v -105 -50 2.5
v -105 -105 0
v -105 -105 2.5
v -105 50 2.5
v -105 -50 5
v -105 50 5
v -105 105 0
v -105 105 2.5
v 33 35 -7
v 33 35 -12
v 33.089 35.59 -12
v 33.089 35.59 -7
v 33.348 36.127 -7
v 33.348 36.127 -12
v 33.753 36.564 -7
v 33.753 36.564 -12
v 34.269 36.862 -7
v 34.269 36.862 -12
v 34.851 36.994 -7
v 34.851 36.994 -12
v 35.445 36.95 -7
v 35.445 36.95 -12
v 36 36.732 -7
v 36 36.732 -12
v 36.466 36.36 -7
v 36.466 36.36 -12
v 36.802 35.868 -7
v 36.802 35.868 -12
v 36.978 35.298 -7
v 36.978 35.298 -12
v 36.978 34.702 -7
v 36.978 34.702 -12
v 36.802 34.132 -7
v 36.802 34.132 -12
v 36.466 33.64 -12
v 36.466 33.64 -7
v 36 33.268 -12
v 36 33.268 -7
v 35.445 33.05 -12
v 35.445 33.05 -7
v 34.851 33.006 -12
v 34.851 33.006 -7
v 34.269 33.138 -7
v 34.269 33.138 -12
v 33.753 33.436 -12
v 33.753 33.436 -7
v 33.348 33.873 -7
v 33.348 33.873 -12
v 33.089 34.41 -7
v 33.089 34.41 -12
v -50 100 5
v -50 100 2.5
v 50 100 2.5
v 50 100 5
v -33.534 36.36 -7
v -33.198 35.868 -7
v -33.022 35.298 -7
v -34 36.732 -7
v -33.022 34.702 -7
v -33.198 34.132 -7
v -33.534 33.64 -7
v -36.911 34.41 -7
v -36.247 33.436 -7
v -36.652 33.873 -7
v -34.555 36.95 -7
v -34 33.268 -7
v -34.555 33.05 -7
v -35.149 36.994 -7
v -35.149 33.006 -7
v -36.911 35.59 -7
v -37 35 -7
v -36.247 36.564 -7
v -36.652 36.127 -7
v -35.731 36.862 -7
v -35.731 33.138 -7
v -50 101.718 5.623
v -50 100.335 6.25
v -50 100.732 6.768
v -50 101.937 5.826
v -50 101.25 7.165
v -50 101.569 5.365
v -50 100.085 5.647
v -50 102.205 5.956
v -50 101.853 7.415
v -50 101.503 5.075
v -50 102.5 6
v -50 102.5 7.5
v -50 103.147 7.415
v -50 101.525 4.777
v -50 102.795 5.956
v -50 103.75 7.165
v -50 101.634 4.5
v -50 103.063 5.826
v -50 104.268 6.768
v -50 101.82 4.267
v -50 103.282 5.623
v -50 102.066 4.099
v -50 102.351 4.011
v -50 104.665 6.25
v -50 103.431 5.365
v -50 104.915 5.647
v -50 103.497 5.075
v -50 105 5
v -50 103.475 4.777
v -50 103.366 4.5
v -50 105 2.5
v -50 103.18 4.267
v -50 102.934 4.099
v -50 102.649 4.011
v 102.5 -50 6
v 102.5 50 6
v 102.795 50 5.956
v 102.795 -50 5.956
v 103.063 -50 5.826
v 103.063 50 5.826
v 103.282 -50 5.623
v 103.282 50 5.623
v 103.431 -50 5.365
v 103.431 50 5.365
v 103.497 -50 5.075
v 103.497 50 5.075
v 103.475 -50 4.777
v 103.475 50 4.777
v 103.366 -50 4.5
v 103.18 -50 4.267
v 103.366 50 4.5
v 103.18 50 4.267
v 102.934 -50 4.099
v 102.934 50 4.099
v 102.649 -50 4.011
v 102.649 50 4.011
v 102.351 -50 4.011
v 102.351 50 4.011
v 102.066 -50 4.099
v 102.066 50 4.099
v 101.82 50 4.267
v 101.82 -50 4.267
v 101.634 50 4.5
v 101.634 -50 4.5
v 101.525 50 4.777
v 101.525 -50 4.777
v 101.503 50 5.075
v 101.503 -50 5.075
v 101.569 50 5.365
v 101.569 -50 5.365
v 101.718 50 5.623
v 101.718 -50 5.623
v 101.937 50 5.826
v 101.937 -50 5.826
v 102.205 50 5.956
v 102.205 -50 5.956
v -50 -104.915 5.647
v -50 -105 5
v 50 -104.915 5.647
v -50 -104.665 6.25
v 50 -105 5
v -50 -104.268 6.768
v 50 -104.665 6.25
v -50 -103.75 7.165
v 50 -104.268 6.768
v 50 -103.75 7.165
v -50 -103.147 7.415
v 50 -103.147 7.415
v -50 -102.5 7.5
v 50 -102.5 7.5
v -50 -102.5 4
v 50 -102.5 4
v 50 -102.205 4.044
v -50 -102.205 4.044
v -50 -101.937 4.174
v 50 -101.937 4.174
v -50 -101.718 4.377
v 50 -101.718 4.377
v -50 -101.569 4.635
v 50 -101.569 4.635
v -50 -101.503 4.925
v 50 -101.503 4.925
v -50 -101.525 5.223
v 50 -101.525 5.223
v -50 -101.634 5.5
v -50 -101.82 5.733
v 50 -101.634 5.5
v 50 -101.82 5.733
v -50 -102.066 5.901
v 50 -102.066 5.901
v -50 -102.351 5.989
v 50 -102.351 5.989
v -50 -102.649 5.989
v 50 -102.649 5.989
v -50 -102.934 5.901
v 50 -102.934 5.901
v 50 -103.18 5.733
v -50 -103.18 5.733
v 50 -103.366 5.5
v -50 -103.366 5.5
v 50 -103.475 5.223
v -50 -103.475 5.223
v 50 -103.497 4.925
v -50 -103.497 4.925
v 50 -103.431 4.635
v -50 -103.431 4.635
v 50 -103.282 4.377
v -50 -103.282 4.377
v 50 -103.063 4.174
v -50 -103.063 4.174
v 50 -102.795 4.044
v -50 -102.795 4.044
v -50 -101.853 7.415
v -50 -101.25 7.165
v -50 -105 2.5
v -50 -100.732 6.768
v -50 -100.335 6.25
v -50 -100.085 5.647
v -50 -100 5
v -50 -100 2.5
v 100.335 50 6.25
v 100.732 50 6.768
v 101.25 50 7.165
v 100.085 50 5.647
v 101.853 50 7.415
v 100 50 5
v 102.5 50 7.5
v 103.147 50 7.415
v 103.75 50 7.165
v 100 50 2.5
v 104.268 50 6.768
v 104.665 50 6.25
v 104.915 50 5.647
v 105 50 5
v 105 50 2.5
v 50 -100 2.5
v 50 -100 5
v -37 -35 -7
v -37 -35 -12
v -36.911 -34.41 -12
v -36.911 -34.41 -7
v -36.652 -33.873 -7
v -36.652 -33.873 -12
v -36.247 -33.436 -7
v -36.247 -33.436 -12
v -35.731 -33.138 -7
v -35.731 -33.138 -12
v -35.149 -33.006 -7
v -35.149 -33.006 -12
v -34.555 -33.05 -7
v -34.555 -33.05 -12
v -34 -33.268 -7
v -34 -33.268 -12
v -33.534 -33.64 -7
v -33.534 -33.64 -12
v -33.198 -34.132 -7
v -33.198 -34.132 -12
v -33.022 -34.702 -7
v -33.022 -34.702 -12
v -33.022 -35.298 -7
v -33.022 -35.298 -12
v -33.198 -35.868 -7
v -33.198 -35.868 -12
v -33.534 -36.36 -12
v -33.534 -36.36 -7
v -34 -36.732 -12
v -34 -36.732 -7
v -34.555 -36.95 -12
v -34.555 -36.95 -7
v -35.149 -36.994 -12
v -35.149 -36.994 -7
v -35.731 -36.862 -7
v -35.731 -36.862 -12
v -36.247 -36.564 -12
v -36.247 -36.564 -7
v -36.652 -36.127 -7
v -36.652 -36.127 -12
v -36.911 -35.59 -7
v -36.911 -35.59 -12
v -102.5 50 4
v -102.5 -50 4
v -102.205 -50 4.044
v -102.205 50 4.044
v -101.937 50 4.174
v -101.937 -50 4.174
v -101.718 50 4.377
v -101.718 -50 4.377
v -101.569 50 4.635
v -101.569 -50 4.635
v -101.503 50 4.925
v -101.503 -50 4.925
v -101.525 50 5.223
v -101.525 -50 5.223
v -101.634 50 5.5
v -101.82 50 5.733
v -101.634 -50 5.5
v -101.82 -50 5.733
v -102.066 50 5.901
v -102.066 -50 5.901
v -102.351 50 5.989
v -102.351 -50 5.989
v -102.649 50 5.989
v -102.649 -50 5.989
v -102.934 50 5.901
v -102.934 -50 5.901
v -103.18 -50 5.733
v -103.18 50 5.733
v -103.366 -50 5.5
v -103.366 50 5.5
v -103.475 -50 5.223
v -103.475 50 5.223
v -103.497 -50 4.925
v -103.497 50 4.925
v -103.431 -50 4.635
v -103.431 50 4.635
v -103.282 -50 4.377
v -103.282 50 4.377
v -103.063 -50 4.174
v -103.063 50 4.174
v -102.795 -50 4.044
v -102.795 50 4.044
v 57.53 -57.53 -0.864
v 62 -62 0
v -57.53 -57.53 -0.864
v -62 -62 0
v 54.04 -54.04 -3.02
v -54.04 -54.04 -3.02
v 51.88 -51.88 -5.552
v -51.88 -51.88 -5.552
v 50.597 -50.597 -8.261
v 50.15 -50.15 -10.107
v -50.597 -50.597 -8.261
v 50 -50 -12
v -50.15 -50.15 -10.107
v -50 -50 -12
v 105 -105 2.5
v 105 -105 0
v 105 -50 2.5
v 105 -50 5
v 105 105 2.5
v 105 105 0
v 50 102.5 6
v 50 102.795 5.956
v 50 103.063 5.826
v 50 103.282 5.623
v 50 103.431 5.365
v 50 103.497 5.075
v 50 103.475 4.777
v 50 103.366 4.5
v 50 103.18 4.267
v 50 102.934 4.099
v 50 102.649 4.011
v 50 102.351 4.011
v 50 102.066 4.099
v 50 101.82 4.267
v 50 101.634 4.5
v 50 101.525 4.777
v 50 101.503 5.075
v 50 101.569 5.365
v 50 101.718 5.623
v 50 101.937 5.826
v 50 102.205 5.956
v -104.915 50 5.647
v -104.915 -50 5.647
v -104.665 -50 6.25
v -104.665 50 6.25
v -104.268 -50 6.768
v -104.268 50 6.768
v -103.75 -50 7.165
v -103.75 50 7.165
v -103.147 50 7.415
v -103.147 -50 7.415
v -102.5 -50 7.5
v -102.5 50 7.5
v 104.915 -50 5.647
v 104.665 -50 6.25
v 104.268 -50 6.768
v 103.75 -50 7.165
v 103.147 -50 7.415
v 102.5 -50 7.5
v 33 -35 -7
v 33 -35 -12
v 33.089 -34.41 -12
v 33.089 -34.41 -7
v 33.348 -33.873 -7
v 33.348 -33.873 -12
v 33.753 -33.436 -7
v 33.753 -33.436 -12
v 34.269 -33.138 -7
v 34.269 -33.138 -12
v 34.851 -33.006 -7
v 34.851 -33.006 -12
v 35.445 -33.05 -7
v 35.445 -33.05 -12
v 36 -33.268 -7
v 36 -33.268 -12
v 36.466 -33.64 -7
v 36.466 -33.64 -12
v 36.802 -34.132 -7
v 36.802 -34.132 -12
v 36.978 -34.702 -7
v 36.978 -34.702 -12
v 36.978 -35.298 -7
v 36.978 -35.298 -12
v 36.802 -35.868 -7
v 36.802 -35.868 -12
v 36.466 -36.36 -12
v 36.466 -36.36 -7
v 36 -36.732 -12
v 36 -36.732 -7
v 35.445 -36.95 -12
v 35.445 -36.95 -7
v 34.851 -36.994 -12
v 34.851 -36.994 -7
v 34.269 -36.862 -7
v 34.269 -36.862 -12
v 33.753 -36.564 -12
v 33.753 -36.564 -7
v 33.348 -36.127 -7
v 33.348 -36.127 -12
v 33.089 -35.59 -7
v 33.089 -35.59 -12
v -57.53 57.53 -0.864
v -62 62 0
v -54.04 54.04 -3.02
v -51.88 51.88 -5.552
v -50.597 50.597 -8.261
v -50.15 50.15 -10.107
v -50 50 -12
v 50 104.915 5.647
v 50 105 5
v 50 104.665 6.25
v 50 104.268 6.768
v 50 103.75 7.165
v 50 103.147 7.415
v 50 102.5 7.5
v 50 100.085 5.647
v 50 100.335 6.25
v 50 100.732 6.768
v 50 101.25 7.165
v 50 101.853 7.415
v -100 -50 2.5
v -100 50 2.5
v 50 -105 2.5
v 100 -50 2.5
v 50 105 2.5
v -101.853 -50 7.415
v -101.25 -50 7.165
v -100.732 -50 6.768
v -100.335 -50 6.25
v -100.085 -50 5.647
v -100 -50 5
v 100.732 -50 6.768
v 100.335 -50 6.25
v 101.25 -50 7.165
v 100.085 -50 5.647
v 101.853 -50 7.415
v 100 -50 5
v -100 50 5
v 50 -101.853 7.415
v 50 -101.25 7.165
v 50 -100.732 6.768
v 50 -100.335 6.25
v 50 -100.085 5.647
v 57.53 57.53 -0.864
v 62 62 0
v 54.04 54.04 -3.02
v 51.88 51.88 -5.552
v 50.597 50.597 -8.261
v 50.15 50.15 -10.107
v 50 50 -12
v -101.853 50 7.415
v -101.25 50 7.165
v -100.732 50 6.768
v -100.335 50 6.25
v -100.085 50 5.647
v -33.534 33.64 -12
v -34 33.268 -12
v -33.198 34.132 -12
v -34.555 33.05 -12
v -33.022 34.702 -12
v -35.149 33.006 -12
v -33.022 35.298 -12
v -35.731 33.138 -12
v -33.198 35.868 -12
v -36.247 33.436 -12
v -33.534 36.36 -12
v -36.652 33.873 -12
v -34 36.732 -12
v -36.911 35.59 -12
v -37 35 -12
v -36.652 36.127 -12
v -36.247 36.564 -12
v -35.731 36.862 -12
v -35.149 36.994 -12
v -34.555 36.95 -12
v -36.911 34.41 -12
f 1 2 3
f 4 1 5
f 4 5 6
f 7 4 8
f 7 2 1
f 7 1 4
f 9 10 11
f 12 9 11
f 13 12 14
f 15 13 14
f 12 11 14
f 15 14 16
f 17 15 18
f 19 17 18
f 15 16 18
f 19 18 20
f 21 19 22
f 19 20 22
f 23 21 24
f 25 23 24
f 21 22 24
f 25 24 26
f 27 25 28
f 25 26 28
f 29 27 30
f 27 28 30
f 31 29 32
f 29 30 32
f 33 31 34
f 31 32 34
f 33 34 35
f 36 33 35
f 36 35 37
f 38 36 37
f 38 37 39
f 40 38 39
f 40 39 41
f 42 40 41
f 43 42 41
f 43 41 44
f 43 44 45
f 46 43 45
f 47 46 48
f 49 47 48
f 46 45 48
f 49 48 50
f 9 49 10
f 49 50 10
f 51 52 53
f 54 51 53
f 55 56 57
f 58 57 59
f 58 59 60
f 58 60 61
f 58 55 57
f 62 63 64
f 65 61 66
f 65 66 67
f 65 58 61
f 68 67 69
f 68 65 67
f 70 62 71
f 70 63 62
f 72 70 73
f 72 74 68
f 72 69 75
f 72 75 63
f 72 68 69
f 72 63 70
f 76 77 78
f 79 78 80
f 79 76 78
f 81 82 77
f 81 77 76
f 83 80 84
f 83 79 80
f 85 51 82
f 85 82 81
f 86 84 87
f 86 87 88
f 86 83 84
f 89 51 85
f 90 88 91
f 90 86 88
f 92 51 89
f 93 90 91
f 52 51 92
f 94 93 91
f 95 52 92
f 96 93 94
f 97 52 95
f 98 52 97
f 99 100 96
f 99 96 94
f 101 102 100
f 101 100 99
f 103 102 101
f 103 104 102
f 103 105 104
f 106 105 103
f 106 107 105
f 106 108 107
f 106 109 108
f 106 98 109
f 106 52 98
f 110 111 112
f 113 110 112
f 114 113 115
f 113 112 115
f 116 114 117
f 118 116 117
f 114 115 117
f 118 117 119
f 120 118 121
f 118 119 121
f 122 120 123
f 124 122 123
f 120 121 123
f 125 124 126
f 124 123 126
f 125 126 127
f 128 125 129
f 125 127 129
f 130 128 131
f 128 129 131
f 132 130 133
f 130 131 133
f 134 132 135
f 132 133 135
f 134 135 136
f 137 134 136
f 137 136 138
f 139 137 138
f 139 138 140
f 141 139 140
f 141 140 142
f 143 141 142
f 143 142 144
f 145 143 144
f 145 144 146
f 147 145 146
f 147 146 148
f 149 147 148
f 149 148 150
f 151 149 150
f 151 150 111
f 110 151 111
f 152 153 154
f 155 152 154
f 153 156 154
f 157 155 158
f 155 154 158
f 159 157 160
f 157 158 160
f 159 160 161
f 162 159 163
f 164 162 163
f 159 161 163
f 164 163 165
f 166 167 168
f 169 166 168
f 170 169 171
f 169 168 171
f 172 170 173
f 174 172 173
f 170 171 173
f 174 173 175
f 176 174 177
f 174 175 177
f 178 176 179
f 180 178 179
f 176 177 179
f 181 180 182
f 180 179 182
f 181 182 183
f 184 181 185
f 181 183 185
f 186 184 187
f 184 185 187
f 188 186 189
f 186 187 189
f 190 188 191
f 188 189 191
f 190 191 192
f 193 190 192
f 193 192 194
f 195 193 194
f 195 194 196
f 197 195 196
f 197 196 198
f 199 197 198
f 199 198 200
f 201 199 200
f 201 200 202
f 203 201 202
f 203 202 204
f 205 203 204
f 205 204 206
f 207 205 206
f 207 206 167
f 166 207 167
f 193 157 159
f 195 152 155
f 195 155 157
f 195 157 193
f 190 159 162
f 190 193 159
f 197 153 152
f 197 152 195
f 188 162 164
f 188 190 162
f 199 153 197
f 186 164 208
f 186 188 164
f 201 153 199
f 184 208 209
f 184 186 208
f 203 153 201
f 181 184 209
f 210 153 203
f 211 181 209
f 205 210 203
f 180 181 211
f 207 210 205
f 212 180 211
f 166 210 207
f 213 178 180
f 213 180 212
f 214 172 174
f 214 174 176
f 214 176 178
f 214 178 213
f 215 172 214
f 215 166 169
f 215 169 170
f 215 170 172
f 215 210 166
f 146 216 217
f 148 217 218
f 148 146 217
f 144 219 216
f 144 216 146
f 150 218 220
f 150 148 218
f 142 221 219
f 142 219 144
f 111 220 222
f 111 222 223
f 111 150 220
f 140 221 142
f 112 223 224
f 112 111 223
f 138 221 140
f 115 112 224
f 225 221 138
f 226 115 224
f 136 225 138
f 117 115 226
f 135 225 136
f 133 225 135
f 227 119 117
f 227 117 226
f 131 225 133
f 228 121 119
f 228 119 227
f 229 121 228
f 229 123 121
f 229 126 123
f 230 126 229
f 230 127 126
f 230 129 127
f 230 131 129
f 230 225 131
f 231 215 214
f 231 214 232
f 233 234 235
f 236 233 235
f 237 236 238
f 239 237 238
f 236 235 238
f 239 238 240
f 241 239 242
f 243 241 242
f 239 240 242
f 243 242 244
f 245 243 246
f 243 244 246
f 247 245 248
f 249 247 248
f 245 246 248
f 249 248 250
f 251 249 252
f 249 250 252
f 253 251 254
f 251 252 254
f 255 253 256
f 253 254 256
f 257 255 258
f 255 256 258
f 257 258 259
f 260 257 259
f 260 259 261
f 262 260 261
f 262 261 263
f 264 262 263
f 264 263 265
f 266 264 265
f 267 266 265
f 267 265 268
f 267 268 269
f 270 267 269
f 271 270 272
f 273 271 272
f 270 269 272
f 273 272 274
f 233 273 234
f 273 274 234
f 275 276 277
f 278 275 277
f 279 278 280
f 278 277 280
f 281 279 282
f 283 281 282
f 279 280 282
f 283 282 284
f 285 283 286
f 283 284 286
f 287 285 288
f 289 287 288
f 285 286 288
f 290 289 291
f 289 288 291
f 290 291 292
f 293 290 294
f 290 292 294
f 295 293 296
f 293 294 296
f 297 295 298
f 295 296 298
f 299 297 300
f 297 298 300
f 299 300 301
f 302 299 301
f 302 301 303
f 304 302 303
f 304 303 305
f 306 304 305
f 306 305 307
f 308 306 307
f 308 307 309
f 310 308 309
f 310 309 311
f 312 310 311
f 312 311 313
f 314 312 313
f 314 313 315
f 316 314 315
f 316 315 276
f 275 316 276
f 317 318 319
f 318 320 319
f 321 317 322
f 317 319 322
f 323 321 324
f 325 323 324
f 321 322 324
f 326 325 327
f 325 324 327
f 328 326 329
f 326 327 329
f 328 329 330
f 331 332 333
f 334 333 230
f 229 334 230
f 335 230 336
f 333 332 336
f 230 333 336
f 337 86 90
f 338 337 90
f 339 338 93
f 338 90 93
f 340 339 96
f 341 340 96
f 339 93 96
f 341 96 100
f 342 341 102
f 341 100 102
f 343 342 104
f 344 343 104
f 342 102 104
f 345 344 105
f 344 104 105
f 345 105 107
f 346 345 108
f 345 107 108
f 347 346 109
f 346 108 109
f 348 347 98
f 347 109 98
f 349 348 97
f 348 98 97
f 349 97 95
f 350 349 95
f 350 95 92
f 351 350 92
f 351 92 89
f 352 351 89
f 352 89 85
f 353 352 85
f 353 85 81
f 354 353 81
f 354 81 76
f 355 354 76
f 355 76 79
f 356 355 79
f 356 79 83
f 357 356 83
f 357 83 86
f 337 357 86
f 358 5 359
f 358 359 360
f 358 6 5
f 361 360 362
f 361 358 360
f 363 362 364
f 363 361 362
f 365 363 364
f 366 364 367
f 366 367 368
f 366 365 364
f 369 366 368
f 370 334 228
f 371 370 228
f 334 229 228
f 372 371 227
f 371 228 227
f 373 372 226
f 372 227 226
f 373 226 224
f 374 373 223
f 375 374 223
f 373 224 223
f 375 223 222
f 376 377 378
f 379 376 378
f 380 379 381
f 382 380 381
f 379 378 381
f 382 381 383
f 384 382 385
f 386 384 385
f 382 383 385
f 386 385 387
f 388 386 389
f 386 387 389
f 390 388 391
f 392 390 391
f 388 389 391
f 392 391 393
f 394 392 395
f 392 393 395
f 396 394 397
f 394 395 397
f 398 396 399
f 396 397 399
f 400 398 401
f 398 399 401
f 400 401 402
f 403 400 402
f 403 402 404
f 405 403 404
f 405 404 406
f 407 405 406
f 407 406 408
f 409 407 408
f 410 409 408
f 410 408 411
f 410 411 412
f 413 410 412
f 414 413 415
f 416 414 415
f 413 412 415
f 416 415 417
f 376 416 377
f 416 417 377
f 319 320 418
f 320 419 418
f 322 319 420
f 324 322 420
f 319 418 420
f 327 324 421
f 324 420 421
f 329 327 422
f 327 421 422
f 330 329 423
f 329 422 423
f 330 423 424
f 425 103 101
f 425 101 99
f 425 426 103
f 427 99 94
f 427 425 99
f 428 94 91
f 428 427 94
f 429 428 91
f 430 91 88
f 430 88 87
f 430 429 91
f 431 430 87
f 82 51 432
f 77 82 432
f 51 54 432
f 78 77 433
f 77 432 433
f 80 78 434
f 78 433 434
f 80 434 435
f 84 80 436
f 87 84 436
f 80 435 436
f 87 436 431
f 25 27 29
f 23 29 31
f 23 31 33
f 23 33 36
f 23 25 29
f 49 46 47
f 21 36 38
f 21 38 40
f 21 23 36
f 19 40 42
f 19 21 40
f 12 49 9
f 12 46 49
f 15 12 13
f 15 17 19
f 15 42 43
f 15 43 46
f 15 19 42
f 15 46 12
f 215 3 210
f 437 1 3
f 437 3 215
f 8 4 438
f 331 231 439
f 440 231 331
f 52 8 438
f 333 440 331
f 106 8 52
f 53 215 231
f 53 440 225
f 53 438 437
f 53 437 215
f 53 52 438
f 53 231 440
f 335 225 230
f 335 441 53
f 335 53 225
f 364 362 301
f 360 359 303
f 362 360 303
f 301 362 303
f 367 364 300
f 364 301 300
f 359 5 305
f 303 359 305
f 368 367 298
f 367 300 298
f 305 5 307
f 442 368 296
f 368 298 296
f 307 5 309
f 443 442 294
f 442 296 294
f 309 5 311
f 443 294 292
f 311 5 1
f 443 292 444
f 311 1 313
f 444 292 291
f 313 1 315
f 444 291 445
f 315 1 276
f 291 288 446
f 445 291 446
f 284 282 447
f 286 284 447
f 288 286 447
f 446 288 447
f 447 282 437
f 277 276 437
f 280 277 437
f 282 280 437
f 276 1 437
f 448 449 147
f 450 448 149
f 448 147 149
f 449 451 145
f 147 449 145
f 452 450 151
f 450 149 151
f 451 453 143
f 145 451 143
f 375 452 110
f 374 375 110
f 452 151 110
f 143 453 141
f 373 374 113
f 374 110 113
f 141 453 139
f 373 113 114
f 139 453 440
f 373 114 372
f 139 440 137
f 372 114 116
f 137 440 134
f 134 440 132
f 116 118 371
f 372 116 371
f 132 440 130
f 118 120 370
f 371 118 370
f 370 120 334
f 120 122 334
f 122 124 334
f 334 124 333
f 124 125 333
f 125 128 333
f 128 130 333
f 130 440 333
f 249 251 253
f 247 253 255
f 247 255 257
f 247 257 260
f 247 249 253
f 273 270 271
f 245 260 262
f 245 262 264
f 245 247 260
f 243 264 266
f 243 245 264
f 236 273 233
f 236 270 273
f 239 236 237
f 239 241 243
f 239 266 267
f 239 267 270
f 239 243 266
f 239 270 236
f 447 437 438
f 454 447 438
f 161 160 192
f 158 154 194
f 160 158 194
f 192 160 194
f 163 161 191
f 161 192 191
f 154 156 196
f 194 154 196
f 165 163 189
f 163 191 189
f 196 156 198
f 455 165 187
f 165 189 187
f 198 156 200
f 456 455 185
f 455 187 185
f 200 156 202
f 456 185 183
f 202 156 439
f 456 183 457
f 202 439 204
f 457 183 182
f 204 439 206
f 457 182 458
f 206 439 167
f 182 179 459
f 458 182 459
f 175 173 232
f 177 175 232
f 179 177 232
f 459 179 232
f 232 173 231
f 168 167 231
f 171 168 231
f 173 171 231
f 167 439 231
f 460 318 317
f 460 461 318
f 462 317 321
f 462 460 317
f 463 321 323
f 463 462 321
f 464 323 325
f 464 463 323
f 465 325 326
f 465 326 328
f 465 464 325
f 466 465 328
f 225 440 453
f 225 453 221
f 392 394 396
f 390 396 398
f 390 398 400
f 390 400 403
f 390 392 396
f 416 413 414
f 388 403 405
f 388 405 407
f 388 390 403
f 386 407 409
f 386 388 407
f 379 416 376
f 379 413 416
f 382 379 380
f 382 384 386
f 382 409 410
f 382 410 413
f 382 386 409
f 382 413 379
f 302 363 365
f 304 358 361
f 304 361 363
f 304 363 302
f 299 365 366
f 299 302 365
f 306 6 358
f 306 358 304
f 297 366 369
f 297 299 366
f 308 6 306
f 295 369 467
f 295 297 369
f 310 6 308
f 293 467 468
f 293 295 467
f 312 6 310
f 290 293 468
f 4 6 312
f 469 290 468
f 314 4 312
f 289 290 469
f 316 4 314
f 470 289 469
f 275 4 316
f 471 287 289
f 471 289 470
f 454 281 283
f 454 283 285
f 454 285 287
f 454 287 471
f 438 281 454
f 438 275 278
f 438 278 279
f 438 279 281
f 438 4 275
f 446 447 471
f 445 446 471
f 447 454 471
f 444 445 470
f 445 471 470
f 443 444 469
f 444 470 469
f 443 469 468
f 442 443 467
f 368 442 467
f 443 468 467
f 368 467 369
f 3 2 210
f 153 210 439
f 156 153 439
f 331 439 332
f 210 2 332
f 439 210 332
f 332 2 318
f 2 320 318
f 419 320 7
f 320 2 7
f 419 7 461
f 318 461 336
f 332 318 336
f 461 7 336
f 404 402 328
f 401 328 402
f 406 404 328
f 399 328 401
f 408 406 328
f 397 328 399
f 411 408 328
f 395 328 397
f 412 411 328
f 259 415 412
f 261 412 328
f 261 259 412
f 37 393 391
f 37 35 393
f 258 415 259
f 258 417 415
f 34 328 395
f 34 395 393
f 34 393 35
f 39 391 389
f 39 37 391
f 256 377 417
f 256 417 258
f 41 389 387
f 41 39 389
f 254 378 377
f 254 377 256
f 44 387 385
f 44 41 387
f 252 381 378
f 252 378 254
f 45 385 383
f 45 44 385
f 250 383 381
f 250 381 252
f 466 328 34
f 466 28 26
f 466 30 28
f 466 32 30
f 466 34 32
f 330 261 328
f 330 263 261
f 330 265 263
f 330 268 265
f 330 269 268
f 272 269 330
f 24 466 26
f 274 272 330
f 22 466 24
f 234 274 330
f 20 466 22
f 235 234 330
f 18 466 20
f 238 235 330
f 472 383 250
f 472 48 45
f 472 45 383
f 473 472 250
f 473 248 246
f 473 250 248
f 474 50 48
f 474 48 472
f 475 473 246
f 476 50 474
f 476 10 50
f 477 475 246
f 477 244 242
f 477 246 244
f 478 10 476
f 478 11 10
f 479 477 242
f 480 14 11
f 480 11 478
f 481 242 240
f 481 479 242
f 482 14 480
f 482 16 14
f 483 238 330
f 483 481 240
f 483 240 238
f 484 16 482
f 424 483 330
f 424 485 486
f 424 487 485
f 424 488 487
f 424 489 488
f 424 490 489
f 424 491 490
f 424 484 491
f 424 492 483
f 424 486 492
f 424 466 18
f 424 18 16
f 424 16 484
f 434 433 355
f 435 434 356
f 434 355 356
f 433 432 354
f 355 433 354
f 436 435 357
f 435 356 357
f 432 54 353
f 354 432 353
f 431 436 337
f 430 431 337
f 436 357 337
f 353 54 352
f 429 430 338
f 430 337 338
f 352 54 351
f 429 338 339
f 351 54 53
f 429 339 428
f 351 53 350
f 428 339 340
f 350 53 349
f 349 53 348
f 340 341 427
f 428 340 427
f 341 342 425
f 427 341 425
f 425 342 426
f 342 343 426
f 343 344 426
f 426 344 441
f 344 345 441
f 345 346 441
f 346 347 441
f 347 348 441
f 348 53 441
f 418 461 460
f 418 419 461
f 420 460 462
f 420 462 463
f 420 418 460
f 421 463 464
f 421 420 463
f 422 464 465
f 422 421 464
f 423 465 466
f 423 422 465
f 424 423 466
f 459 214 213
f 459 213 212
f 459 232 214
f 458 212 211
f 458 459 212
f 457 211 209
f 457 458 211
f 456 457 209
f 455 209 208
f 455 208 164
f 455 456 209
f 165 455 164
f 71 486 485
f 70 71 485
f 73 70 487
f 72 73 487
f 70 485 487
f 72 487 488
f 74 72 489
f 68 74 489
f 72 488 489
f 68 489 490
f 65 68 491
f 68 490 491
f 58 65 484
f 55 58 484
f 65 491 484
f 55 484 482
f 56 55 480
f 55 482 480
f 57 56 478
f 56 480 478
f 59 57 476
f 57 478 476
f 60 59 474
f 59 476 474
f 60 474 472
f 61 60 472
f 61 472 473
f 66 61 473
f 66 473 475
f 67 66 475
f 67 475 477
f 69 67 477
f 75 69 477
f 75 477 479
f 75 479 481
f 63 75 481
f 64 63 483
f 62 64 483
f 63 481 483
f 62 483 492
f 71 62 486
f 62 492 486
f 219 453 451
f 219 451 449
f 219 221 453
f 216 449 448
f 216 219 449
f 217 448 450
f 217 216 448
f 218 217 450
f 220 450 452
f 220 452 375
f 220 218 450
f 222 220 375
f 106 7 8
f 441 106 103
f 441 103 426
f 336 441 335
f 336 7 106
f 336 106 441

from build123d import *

# Parameters (mm, degrees)
SKETCH_1_W               = 420
SKETCH_1_H               = 420
EXTRUDE_1_DEPTH          = 5
SKETCH_3_W               = 50
SKETCH_3_H               = 10
SKETCH_3_W_2             = 10
SKETCH_3_H_2             = 50
EXTRUDE_2_DEPTH          = 10
SKETCH_4_W               = 200
SKETCH_4_H               = 10
SKETCH_4_W_2             = 10
SKETCH_4_H_2             = 200
EXTRUDE_3_DEPTH          = 10
FILLET_1_R               = 5
SKETCH_5_R               = 2
CUT_EXTRUDE_1_DEPTH      = 422.366823564
SKETCH_6_R               = 2
CUT_EXTRUDE_2_DEPTH      = 375.733238451
CUT_EXTRUDE_3_DEPTH      = 422.366823564
CUT_EXTRUDE_3_DEPTH_BACK = 422.366823564
SKETCH_7_R               = 2
SKETCH_8_R               = 2
CUT_EXTRUDE_4_DEPTH      = 375.733238451
CUT_EXTRUDE_5_DEPTH      = 422.366823564
CUT_EXTRUDE_5_DEPTH_BACK = 422.366823564
SKETCH_9_R               = 2
SKETCH_10_R              = 2
CUT_EXTRUDE_6_DEPTH      = 375.733238451
CUT_EXTRUDE_7_DEPTH      = 422.366823564
CUT_EXTRUDE_7_DEPTH_BACK = 422.366823564
SKETCH_11_R              = 2
SKETCH_12_R              = 2
CUT_EXTRUDE_8_DEPTH      = 375.733238451
SCALE_1_SCALE            = 0.5
SKETCH_13_W              = 210
SKETCH_13_H              = 210
CUT_EXTRUDE_9_DEPTH      = 90
SKETCH_14_W              = 100
SKETCH_14_H              = 100
EXTRUDE_4_DEPTH          = 12
FILLET_2_R               = 12
SKETCH_15_R              = 2
CUT_EXTRUDE_10_DEPTH     = 5


with BuildPart() as part:
    # 草图1 → 凸台-拉伸1 (new body)
    with BuildSketch(Plane.XY):
        Rectangle(SKETCH_1_W, SKETCH_1_H)
    extrude(amount=EXTRUDE_1_DEPTH)

    # 草图3 → 凸台-拉伸2 (add)
    with BuildSketch(Plane(origin=(0, 0, 0), x_dir=(-1, 0, 0), z_dir=(0, 0, -1))):
        with Locations((-130, -205)):
            Rectangle(SKETCH_3_W, SKETCH_3_H)
        with Locations((-205, -130)):
            Rectangle(SKETCH_3_W_2, SKETCH_3_H_2)
        with Locations((-205, 130)):
            Rectangle(SKETCH_3_W_2, SKETCH_3_H_2)
        with Locations((-130, 205)):
            Rectangle(SKETCH_3_W, SKETCH_3_H)
        with Locations((205, 130)):
            Rectangle(SKETCH_3_W_2, SKETCH_3_H_2)
        with Locations((130, 205)):
            Rectangle(SKETCH_3_W, SKETCH_3_H)
        with Locations((205, -130)):
            Rectangle(SKETCH_3_W_2, SKETCH_3_H_2)
        with Locations((130, -205)):
            Rectangle(SKETCH_3_W, SKETCH_3_H)
    extrude(amount=EXTRUDE_2_DEPTH)

    # 草图4 → 凸台-拉伸3 (add)
    with BuildSketch(Plane.XY.offset(5)):
        with Locations((0, -205)):
            Rectangle(SKETCH_4_W, SKETCH_4_H)
        with Locations((205, 0)):
            Rectangle(SKETCH_4_W_2, SKETCH_4_H_2)
        with Locations((0, 205)):
            Rectangle(SKETCH_4_W, SKETCH_4_H)
        with Locations((-205, 0)):
            Rectangle(SKETCH_4_W_2, SKETCH_4_H_2)
    extrude(amount=EXTRUDE_3_DEPTH)

    # 圆角1
    fillet_1_edges = [part.edges().sort_by_distance(p)[0] for p in [
        (-210, 0, 15),
        (-200, 0, 15),
        (0, -210, 15),
        (0, -200, 15),
        (0, 200, 15),
        (0, 210, 15),
        (200, 0, 15),
        (210, 0, 15),
        (200, -130, -10),
        (210, -130, -10),
        (130, 210, -10),
        (130, 200, -10),
        (200, 130, -10),
        (210, 130, -10),
        (-130, -200, -10),
        (-130, -210, -10),
        (-130, 210, -10),
        (-130, 200, -10),
        (-210, 130, -10),
        (-200, 130, -10),
        (-210, -130, -10),
        (-200, -130, -10),
        (130, -200, -10),
        (130, -210, -10),
    ]]
    fillet(fillet_1_edges, radius=FILLET_1_R - 0.0001)  # a hair under: the kernel refuses the full size

    # 草图5 → 切除-拉伸1 (cut, through all)
    with BuildSketch(Plane(origin=(0, 155, 0), x_dir=(1, 0, 0), z_dir=(0, 1, 0))):
        with Locations(Location((205, 5, 0), (0, 0, 270))):
            Circle(SKETCH_5_R)
    extrude(amount=-CUT_EXTRUDE_1_DEPTH, mode=Mode.SUBTRACT)

    # 草图6 → 切除-拉伸2 (cut, through all)
    with BuildSketch(Plane(origin=(0, 100, 0), x_dir=(1, 0, 0), z_dir=(0, 1, 0))):
        with Locations(Location((205, -10, 0), (0, 0, 270))):
            Circle(SKETCH_6_R)
    extrude(amount=-CUT_EXTRUDE_2_DEPTH, mode=Mode.SUBTRACT)

    # 草图7 → 切除-拉伸3 (cut, two sides: drawn at the far end of the back side and taken through both)
    with BuildSketch(Plane(origin=(155, 0, 0), x_dir=(0, 0, -1), z_dir=(1, 0, 0)).offset(-CUT_EXTRUDE_3_DEPTH_BACK)):
        with Locations((5, -205)):
            Circle(SKETCH_7_R)
    extrude(amount=CUT_EXTRUDE_3_DEPTH + CUT_EXTRUDE_3_DEPTH_BACK, mode=Mode.SUBTRACT)

    # 草图8 → 切除-拉伸4 (cut, through all)
    with BuildSketch(Plane(origin=(100, 0, 0), x_dir=(0, 0, -1), z_dir=(1, 0, 0))):
        with Locations((-10, -205)):
            Circle(SKETCH_8_R)
    extrude(amount=-CUT_EXTRUDE_4_DEPTH, mode=Mode.SUBTRACT)

    # 草图9 → 切除-拉伸5 (cut, two sides: drawn at the far end of the back side and taken through both)
    with BuildSketch(Plane.XZ.offset(155).offset(-CUT_EXTRUDE_5_DEPTH_BACK)):
        with Locations((-205, -5)):
            Circle(SKETCH_9_R)
    extrude(amount=CUT_EXTRUDE_5_DEPTH + CUT_EXTRUDE_5_DEPTH_BACK, mode=Mode.SUBTRACT)

    # 草图10 → 切除-拉伸6 (cut, through all)
    with BuildSketch(Plane.XZ.offset(100)):
        with Locations(Location((-205, 10, 0), (0, 0, 270))):
            Circle(SKETCH_10_R)
    extrude(amount=-CUT_EXTRUDE_6_DEPTH, mode=Mode.SUBTRACT)

    # 草图11 → 切除-拉伸7 (cut, two sides: drawn at the far end of the back side and taken through both)
    with BuildSketch(Plane.ZY.offset(155).offset(-CUT_EXTRUDE_7_DEPTH_BACK)):
        with Locations(Location((-5, 205, 0), (0, 0, 270))):
            Circle(SKETCH_11_R)
    extrude(amount=CUT_EXTRUDE_7_DEPTH + CUT_EXTRUDE_7_DEPTH_BACK, mode=Mode.SUBTRACT)

    # 草图12 → 切除-拉伸8 (cut, through all)
    with BuildSketch(Plane.ZY.offset(100)):
        with Locations((10, 205)):
            Circle(SKETCH_12_R)
    extrude(amount=-CUT_EXTRUDE_8_DEPTH, mode=Mode.SUBTRACT)


with BuildPart() as part_1:
    # 缩放比例1: scaled about (0, 0, 0)
    add(part.part.scale(SCALE_1_SCALE))

    # 草图13 → 切除-拉伸9 (cut)
    with BuildSketch(Plane(origin=(0, 0, 0), x_dir=(-1, 0, 0), z_dir=(0, 0, -1))):
        Rectangle(SKETCH_13_W, SKETCH_13_H)
    extrude(amount=CUT_EXTRUDE_9_DEPTH, mode=Mode.SUBTRACT)

    # 草图14 → 凸台-拉伸4 (add)
    with BuildSketch(Plane(origin=(0, 0, 0), x_dir=(-1, 0, 0), z_dir=(0, 0, -1))):
        Rectangle(SKETCH_14_W, SKETCH_14_H)
    extrude(amount=EXTRUDE_4_DEPTH)

    # 圆角2
    fillet_2_edges = [part_1.edges().sort_by_distance(p)[0] for p in [
        (50, 0, 0),
        (0, -50, 0),
        (-50, 0, 0),
        (0, 50, 0),
    ]]
    fillet(fillet_2_edges, radius=FILLET_2_R - 0.0001)  # a hair under: the kernel refuses the full size

    # 草图15 → 切除-拉伸10 (cut)
    with BuildSketch(Plane(origin=(0, 0, -12), x_dir=(-1, 0, 0), z_dir=(0, 0, -1))):
        with Locations((-35, 35)):
            Circle(SKETCH_15_R)
        with Locations((35, 35)):
            Circle(SKETCH_15_R)
        with Locations((-35, -35)):
            Circle(SKETCH_15_R)
        with Locations((35, -35)):
            Circle(SKETCH_15_R)
    extrude(amount=-CUT_EXTRUDE_10_DEPTH, mode=Mode.SUBTRACT)


solid = part_1.part
